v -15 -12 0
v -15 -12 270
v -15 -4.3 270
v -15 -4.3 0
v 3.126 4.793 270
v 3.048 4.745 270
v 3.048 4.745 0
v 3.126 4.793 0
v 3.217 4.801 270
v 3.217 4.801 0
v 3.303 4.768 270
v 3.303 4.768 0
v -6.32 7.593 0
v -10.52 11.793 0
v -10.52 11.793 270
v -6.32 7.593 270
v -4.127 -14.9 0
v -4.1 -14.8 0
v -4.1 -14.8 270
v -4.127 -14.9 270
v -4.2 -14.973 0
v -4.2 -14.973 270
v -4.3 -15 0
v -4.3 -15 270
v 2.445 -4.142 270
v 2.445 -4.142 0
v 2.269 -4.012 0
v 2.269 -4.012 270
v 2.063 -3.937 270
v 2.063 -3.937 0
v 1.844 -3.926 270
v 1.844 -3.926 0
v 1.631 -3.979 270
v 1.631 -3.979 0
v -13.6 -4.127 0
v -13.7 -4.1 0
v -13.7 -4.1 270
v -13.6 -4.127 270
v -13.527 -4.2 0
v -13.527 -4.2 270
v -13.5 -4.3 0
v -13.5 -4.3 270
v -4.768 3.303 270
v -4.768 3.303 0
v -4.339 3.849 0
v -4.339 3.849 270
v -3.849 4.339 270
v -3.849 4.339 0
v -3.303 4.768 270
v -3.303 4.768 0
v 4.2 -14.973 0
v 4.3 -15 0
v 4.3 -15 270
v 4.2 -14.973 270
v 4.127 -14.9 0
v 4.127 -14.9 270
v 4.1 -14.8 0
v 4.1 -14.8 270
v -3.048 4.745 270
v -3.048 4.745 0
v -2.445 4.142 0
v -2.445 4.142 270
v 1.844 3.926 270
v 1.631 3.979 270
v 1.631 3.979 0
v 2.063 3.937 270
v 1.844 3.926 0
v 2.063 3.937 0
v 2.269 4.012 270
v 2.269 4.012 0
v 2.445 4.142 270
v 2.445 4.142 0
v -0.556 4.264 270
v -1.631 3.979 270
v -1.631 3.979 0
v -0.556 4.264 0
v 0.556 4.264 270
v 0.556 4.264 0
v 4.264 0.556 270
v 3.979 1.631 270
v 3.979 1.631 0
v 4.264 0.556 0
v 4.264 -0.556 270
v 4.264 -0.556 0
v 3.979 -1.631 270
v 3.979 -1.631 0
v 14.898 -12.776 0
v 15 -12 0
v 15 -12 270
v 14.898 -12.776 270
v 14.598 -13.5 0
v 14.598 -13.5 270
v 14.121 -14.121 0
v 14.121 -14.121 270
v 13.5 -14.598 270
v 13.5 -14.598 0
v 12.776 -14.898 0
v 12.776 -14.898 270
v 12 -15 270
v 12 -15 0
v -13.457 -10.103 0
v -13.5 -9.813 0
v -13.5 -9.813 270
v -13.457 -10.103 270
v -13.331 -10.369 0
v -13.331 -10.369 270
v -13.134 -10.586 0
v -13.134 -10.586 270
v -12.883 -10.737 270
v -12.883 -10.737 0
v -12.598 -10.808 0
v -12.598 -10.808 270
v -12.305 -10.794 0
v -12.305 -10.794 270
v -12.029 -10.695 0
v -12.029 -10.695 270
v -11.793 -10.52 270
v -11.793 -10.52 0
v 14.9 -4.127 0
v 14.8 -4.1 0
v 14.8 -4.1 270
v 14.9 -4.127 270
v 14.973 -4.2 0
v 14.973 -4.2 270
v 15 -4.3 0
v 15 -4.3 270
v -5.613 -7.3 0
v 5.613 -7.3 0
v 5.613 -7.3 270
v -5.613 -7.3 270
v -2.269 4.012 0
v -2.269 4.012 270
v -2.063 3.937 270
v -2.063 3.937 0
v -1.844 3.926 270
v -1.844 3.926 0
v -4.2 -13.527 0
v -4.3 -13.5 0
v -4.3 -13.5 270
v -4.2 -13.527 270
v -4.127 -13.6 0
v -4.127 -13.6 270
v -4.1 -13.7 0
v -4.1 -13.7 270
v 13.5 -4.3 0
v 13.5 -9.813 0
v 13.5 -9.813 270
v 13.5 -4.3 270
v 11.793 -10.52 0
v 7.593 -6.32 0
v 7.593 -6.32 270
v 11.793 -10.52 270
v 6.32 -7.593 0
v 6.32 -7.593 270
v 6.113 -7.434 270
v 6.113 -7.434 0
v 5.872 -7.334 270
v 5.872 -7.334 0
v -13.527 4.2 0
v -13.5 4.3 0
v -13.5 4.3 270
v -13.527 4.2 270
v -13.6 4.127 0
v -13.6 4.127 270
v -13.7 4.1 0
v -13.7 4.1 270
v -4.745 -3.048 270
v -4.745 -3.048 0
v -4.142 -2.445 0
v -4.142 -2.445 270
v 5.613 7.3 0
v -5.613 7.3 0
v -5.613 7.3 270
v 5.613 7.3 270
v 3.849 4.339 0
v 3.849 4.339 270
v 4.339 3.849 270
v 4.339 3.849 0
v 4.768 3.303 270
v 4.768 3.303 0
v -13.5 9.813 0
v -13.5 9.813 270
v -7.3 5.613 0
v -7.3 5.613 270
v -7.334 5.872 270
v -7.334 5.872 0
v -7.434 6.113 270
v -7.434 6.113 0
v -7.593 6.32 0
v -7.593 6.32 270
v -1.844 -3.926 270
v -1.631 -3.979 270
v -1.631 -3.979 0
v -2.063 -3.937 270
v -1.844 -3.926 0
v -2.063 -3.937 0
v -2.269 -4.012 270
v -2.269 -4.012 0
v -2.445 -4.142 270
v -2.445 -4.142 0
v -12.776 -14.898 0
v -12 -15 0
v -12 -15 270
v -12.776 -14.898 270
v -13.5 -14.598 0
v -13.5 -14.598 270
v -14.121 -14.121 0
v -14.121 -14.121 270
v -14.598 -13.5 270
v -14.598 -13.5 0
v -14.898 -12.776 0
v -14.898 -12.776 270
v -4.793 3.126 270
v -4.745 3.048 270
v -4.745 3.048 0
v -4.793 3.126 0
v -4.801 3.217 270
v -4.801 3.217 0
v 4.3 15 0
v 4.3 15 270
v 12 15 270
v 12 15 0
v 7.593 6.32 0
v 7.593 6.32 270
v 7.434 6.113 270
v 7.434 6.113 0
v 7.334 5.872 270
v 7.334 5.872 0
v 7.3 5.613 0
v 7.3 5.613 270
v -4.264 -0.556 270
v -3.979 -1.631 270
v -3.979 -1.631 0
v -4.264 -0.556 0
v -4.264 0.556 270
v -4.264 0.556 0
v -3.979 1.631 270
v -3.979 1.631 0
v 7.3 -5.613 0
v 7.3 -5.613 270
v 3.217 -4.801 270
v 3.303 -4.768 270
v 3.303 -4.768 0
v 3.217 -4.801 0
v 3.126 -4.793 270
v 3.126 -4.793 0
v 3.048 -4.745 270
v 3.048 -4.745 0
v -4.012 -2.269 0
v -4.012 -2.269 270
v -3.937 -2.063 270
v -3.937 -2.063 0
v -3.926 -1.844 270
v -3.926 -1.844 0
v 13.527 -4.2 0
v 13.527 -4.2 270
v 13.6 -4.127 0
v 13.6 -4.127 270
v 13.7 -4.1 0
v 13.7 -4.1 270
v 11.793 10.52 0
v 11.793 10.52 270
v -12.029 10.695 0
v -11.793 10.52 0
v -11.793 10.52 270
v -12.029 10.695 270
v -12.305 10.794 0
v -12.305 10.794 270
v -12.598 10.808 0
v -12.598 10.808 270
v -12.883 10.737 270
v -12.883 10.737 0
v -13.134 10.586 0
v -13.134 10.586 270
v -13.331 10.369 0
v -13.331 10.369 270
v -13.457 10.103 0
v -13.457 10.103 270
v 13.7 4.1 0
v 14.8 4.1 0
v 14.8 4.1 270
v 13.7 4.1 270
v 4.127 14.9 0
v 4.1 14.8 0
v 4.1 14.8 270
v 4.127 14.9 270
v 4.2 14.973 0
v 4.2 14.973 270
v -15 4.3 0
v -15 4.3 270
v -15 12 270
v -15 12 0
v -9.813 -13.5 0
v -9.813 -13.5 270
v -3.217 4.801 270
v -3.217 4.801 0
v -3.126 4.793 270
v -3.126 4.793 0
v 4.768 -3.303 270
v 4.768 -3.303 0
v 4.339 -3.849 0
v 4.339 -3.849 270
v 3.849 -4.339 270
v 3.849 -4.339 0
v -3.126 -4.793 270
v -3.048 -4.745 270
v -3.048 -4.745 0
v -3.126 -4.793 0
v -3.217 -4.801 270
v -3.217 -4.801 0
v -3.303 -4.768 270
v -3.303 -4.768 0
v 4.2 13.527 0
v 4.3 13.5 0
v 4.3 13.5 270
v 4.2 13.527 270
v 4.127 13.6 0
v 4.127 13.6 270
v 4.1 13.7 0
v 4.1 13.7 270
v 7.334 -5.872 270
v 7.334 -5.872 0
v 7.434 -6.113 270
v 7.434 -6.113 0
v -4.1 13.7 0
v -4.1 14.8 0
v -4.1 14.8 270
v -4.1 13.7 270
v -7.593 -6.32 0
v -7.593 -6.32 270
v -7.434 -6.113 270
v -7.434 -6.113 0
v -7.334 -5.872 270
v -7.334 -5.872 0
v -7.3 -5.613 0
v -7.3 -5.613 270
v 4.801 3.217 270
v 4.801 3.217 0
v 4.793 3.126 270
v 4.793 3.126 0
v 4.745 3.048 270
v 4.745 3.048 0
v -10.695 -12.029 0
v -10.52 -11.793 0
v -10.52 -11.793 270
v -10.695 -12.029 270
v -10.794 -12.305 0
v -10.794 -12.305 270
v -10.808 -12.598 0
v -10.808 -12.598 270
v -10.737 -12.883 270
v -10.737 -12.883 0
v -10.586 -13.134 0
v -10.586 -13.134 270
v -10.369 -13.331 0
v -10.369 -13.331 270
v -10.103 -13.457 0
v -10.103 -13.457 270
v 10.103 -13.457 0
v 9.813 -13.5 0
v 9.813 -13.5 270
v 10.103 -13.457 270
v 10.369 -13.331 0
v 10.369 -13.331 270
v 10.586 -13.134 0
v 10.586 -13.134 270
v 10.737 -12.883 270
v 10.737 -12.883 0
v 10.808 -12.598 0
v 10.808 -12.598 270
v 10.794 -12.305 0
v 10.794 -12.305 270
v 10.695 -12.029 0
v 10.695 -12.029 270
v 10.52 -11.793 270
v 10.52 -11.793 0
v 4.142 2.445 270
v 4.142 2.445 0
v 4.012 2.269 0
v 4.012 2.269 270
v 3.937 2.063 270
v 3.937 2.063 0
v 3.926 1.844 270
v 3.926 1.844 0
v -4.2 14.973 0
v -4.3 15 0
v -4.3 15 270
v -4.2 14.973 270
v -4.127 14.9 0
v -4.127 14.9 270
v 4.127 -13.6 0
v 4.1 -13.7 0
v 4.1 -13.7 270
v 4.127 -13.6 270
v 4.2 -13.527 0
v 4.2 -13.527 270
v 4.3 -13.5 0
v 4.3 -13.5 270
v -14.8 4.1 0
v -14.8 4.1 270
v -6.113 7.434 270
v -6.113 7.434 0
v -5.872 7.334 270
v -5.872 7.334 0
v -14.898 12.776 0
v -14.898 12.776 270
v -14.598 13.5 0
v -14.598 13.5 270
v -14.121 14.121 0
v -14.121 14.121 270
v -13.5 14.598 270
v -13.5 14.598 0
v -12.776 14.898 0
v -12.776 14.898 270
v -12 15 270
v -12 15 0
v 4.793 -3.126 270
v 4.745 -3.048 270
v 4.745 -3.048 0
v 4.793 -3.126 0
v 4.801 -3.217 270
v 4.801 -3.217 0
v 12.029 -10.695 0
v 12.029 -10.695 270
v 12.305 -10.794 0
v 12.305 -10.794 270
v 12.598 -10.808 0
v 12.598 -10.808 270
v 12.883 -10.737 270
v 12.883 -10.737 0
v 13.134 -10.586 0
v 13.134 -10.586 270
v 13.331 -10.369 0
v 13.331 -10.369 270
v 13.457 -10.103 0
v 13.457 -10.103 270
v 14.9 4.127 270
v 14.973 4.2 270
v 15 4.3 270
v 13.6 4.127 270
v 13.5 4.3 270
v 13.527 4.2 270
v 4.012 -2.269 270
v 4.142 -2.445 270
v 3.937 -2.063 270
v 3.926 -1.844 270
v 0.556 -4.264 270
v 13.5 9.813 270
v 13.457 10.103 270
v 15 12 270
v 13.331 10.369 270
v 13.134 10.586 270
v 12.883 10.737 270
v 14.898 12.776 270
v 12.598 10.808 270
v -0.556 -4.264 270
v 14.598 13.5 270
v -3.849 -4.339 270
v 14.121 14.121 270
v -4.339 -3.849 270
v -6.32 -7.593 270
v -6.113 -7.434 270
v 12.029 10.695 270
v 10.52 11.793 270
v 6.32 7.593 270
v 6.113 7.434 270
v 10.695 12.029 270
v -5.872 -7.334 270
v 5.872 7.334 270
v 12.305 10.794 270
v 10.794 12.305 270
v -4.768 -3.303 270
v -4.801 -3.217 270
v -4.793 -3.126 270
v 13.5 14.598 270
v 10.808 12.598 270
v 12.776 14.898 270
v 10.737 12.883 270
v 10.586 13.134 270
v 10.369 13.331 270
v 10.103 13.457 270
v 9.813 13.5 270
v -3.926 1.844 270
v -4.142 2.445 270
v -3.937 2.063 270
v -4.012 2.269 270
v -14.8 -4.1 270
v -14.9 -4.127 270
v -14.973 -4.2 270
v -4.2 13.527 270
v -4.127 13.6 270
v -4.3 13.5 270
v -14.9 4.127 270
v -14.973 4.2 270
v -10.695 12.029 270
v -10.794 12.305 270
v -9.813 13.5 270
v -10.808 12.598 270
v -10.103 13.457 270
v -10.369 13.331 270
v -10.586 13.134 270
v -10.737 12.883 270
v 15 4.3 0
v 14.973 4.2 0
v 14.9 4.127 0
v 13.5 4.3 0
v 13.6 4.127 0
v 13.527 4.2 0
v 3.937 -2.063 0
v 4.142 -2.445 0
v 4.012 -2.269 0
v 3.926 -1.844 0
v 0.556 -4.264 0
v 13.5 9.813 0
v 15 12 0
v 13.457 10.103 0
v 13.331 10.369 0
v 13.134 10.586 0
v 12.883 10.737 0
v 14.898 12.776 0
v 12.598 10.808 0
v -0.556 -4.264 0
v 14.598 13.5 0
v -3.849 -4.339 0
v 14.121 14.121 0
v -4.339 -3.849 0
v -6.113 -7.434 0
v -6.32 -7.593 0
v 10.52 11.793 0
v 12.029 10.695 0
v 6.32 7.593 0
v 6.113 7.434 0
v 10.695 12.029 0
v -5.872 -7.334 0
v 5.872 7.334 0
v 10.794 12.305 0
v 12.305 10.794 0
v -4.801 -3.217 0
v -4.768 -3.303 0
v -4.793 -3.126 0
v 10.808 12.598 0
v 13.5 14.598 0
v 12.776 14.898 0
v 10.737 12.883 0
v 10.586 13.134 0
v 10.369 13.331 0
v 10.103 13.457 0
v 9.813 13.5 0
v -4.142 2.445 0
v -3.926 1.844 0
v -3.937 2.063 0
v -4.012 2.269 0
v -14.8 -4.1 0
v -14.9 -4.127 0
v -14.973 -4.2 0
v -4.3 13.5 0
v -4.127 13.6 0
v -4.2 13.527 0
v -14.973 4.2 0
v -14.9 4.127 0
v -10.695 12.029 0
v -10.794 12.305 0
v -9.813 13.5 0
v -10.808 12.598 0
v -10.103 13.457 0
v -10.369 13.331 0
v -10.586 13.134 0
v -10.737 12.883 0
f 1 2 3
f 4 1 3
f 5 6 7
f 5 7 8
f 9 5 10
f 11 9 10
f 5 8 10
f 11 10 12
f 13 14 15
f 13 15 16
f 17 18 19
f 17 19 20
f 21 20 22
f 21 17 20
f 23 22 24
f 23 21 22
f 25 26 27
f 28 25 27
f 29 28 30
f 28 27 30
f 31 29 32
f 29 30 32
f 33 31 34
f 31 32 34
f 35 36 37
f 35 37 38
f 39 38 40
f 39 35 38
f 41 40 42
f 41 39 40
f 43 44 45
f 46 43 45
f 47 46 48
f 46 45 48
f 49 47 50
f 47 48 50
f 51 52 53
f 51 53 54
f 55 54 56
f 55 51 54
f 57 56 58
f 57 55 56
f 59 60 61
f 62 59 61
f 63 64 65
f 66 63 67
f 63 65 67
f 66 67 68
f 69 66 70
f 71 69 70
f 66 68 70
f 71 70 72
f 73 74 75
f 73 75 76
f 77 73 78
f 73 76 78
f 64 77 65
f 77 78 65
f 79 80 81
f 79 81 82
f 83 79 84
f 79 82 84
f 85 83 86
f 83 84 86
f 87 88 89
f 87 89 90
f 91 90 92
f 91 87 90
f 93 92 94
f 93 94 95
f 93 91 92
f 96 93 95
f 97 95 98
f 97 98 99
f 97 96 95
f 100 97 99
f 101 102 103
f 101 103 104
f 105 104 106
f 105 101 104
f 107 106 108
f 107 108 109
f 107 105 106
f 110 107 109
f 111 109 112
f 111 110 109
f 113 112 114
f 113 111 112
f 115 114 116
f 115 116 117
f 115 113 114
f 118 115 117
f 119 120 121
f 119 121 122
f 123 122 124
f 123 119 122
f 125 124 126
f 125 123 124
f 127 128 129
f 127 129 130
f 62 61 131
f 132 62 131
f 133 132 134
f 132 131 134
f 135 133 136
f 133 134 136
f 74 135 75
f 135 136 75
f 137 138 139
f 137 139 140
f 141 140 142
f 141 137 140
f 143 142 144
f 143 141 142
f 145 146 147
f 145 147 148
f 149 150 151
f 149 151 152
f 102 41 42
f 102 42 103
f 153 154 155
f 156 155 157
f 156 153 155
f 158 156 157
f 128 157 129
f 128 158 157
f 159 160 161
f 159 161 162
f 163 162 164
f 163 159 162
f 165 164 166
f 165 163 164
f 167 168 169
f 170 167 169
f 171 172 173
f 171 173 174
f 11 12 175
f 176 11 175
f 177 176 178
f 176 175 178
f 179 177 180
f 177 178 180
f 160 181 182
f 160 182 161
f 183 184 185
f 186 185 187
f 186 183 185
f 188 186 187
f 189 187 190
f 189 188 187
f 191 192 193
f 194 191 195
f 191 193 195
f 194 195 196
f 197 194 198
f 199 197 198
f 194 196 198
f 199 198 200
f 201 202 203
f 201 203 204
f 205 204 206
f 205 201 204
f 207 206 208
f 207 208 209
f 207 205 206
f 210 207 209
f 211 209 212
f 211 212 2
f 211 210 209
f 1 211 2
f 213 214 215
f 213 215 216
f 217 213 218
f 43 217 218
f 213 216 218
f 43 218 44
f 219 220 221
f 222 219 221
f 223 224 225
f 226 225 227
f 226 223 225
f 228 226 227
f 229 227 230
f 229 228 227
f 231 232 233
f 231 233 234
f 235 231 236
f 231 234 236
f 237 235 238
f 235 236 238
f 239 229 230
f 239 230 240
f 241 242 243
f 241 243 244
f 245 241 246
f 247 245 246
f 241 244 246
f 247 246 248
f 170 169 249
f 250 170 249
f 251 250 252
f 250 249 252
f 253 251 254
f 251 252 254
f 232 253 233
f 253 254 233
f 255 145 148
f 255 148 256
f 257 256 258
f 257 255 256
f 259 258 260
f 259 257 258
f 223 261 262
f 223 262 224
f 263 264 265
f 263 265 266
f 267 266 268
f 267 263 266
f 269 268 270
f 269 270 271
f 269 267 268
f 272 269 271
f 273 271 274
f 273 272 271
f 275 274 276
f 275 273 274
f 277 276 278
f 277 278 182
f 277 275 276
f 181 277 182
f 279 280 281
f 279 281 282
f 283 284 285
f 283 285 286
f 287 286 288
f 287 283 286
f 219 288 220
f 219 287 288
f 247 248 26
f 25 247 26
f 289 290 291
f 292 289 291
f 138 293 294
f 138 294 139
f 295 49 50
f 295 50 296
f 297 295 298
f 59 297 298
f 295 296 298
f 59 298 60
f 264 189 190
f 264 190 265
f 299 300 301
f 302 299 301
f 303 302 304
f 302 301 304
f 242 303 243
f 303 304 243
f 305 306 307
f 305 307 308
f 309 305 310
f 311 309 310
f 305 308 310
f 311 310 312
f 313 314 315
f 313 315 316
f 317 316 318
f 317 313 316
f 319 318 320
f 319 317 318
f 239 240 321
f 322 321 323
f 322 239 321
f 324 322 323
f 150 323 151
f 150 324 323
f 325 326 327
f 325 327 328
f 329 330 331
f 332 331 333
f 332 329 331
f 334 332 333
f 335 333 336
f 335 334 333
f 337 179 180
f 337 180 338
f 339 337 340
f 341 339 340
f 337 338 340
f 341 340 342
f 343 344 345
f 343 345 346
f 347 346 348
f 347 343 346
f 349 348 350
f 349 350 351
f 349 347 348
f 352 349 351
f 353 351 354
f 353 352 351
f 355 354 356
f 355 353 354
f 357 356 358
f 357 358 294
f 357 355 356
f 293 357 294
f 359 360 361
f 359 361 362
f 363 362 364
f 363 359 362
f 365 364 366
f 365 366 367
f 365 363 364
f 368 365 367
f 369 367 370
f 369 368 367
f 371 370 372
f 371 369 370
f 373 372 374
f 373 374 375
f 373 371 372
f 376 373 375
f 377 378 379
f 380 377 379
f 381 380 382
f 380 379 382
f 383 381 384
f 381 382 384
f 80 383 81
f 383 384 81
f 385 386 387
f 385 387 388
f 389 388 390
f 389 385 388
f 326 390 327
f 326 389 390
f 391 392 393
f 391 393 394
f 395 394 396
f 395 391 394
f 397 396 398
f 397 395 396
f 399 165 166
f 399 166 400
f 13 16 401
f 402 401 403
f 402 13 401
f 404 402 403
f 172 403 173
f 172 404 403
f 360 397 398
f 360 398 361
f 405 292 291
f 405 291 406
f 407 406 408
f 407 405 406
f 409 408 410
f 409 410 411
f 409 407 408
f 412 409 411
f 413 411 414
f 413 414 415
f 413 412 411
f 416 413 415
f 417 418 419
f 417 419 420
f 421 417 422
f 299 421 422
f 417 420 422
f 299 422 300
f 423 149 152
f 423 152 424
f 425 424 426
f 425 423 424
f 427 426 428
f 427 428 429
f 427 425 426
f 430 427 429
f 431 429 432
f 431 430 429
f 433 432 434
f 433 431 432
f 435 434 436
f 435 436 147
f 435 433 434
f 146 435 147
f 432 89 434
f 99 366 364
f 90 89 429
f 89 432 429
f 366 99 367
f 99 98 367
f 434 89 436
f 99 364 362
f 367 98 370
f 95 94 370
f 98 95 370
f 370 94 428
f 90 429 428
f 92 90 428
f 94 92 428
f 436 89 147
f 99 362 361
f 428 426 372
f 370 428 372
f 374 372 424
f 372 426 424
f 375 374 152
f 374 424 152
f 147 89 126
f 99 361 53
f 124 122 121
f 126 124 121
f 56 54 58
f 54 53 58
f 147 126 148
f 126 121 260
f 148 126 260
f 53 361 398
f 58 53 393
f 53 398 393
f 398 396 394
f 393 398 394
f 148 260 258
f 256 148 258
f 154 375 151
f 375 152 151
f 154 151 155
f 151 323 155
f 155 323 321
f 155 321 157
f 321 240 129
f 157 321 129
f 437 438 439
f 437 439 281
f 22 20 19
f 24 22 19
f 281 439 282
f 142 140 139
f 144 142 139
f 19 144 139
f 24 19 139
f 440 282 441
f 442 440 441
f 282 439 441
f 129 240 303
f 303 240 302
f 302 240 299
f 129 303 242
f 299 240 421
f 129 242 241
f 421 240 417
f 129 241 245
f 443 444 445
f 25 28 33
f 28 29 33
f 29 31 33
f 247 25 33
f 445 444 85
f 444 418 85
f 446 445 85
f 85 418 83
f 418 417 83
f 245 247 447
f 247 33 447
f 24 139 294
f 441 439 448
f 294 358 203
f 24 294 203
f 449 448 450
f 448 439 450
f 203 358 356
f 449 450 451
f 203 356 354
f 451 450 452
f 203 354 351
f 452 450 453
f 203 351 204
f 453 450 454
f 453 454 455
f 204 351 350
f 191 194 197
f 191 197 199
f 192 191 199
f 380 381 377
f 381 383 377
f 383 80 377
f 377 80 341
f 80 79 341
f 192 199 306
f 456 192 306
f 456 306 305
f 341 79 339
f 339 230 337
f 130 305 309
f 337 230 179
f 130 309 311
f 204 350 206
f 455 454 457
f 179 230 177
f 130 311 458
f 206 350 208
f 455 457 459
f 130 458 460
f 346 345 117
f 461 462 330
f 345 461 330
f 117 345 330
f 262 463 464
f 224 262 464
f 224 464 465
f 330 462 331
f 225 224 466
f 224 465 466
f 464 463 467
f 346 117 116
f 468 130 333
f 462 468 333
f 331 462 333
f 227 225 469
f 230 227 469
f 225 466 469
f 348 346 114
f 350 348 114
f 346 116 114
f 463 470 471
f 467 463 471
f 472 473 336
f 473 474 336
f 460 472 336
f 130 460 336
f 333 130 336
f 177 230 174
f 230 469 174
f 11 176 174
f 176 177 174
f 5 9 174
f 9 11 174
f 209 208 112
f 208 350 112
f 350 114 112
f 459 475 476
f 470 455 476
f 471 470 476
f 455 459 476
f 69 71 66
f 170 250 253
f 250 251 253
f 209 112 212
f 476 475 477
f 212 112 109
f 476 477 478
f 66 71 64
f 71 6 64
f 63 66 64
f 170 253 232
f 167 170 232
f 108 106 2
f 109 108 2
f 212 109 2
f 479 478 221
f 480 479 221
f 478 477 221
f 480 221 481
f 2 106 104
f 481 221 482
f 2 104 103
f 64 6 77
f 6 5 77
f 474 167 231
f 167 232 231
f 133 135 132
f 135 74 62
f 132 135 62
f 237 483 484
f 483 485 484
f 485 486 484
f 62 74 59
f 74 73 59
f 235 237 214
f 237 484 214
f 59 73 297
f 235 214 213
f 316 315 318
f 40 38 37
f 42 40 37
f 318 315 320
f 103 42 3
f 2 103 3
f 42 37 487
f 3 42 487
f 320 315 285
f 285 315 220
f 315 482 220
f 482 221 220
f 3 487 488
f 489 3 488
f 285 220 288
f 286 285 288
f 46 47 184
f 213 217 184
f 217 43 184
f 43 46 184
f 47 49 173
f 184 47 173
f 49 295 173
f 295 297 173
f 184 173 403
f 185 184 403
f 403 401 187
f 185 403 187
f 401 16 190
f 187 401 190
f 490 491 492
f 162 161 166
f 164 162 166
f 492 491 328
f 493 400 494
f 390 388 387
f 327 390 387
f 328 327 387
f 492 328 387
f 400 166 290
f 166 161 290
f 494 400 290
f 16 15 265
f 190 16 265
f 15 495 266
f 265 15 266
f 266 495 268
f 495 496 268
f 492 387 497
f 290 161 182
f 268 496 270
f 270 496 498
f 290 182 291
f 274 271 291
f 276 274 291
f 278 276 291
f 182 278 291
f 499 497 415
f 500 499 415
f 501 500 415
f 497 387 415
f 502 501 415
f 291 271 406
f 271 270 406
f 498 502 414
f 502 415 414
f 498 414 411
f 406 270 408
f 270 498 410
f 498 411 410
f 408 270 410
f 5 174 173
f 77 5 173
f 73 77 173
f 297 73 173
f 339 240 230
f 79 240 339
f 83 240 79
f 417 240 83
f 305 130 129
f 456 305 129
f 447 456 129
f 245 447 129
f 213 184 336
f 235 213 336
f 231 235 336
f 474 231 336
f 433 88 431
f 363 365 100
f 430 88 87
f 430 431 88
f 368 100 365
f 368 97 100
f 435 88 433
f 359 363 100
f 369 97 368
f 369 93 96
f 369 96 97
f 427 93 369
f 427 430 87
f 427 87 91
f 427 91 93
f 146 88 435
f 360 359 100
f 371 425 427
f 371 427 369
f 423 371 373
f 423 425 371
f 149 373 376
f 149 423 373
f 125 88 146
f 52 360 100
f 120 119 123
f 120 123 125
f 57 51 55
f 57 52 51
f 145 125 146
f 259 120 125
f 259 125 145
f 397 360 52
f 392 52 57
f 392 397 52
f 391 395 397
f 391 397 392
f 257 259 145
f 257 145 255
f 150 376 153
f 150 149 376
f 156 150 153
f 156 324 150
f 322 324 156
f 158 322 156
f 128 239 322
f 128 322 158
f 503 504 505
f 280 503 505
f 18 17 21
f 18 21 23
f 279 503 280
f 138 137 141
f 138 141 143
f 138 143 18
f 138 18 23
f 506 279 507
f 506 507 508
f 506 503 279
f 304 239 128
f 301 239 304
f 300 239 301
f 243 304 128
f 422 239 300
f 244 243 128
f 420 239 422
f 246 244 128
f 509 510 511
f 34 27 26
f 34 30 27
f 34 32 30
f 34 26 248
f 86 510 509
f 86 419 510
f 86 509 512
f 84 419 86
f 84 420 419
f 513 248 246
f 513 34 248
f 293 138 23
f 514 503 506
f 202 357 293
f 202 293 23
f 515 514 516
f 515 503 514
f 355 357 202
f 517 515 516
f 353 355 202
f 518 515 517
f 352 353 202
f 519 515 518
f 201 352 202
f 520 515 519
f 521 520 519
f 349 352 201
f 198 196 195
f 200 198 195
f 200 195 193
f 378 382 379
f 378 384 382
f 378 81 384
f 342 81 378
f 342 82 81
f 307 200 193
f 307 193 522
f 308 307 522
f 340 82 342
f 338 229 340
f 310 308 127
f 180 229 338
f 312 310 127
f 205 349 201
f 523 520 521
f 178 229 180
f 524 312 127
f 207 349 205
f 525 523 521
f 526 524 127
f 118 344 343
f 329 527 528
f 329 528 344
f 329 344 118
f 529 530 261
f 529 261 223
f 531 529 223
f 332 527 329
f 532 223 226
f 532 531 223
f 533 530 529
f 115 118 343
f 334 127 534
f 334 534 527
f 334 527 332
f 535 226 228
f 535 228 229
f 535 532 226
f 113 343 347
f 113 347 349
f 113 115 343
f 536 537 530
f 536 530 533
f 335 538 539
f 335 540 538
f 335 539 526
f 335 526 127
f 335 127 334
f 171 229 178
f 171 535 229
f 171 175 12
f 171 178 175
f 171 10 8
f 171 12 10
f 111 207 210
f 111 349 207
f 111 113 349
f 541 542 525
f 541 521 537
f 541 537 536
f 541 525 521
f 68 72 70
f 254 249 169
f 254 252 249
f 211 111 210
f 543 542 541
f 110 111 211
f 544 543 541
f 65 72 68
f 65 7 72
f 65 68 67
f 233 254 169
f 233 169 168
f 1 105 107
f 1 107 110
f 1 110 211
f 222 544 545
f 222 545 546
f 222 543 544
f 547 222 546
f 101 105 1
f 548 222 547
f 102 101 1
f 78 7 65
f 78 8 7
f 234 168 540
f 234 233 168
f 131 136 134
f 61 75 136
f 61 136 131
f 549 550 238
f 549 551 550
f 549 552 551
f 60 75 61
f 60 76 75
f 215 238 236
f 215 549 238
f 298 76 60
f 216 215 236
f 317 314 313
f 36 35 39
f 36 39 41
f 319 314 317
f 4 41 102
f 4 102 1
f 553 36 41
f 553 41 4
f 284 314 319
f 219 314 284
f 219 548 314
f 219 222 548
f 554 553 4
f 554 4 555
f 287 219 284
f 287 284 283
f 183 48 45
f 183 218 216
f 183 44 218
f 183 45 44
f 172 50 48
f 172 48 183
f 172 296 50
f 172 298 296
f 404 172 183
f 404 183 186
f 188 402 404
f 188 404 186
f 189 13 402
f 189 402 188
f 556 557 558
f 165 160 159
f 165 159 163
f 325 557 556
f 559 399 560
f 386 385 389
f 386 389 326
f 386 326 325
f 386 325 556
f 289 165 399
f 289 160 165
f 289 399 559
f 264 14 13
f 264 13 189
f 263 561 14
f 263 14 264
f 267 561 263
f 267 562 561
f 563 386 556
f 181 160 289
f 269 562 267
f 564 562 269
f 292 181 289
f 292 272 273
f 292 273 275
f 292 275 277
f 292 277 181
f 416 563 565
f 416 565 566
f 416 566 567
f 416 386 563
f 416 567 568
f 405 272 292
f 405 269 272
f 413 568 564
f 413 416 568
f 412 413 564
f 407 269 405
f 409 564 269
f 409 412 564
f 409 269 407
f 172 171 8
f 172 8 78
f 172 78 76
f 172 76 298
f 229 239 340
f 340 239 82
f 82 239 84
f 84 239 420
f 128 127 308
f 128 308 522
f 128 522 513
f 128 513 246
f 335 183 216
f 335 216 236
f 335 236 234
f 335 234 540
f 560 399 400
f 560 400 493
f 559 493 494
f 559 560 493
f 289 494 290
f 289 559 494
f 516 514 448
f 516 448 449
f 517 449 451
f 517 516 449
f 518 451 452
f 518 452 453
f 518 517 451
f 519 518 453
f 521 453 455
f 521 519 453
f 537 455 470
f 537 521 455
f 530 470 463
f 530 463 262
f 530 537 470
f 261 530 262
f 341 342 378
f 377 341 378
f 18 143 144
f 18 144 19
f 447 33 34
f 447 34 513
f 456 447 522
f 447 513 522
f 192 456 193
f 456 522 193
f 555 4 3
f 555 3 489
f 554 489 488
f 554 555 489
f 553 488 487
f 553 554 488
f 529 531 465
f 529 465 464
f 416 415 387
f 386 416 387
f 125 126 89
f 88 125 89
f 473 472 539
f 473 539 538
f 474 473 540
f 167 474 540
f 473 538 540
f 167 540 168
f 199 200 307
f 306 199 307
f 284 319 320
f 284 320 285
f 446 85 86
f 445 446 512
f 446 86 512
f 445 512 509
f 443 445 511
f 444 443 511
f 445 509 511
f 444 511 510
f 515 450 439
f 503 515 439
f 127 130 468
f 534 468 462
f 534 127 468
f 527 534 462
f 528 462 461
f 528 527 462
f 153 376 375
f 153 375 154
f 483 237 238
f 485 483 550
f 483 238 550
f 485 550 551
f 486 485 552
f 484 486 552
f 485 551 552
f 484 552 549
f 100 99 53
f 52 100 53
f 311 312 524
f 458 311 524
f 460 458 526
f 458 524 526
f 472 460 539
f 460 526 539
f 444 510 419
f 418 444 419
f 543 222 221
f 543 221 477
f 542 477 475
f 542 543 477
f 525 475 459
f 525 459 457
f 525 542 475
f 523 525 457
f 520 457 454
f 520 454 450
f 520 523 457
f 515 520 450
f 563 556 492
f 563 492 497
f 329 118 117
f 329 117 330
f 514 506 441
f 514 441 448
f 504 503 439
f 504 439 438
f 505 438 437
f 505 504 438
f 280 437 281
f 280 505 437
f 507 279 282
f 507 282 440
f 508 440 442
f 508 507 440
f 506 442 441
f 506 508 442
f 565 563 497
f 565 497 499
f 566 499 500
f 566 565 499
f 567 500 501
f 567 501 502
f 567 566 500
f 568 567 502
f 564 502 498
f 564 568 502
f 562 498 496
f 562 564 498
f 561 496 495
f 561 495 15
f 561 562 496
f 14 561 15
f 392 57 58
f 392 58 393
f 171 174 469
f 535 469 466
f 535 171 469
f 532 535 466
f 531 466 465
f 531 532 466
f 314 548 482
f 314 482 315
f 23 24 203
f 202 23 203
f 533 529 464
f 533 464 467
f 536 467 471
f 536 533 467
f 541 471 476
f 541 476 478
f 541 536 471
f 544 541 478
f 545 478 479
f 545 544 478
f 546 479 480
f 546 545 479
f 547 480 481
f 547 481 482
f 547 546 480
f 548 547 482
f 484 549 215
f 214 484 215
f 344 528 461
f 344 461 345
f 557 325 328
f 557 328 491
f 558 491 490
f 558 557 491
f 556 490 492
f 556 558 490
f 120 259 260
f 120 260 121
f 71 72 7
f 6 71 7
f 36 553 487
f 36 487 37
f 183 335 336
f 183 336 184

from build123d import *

# Parameters (mm, degrees)
EXTRUDE1_DEPTH = 270


with BuildPart() as part:
    # Sketch1 → Extrude1 (new body)
    with BuildSketch(Plane.XY):
        with BuildLine():
            Line((-12, 15), (-4.3, 15))
            ThreePointArc((-4.3, 15), (-4.158578644, 14.941421356), (-4.1, 14.8))
            Line((-4.1, 14.8), (-4.1, 13.7))
            ThreePointArc((-4.1, 13.7), (-4.158578644, 13.558578644), (-4.3, 13.5))
            Line((-4.3, 13.5), (-9.812994231, 13.5))
            ThreePointArc((-9.812994231, 13.5), (-10.736873764, 12.882683432), (-10.520101013, 11.792893219))
            Line((-10.520101013, 11.792893219), (-6.320101013, 7.592893219))
            ThreePointArc((-6.320101013, 7.592893219), (-5.995677664, 7.376120467), (-5.612994231, 7.3))
            Line((-5.612994231, 7.3), (5.612994231, 7.3))
            ThreePointArc((5.612994231, 7.3), (5.995677664, 7.376120467), (6.320101013, 7.592893219))
            Line((6.320101013, 7.592893219), (10.520101013, 11.792893219))
            ThreePointArc((10.520101013, 11.792893219), (10.736873764, 12.882683432), (9.812994231, 13.5))
            Line((9.812994231, 13.5), (4.3, 13.5))
            ThreePointArc((4.3, 13.5), (4.158578644, 13.558578644), (4.1, 13.7))
            Line((4.1, 13.7), (4.1, 14.8))
            ThreePointArc((4.1, 14.8), (4.158578644, 14.941421356), (4.3, 15))
            Line((4.3, 15), (12, 15))
            ThreePointArc((12, 15), (14.121320344, 14.121320344), (15, 12))
            Line((15, 12), (15, 4.3))
            ThreePointArc((15, 4.3), (14.941421356, 4.158578644), (14.8, 4.1))
            Line((14.8, 4.1), (13.7, 4.1))
            ThreePointArc((13.7, 4.1), (13.558578644, 4.158578644), (13.5, 4.3))
            Line((13.5, 4.3), (13.5, 9.812994231))
            ThreePointArc((13.5, 9.812994231), (12.882683432, 10.736873764), (11.792893219, 10.520101013))
            Line((11.792893219, 10.520101013), (7.592893219, 6.320101013))
            ThreePointArc((7.592893219, 6.320101013), (7.376120467, 5.995677664), (7.3, 5.612994231))
            Line((7.3, 5.612994231), (7.3, -5.612994231))
            ThreePointArc((7.3, -5.612994231), (7.376120467, -5.995677664), (7.592893219, -6.320101013))
            Line((7.592893219, -6.320101013), (11.792893219, -10.520101013))
            ThreePointArc((11.792893219, -10.520101013), (12.882683432, -10.736873764), (13.5, -9.812994231))
            Line((13.5, -9.812994231), (13.5, -4.3))
            ThreePointArc((13.5, -4.3), (13.558578644, -4.158578644), (13.7, -4.1))
            Line((13.7, -4.1), (14.8, -4.1))
            ThreePointArc((14.8, -4.1), (14.941421356, -4.158578644), (15, -4.3))
            Line((15, -4.3), (15, -12))
            ThreePointArc((15, -12), (14.121320344, -14.121320344), (12, -15))
            Line((12, -15), (4.3, -15))
            ThreePointArc((4.3, -15), (4.158578644, -14.941421356), (4.1, -14.8))
            Line((4.1, -14.8), (4.1, -13.7))
            ThreePointArc((4.1, -13.7), (4.158578644, -13.558578644), (4.3, -13.5))
            Line((4.3, -13.5), (9.812994231, -13.5))
            ThreePointArc((9.812994231, -13.5), (10.736873764, -12.882683432), (10.520101013, -11.792893219))
            Line((10.520101013, -11.792893219), (6.320101013, -7.592893219))
            ThreePointArc((6.320101013, -7.592893219), (5.995677664, -7.376120467), (5.612994231, -7.3))
            Line((5.612994231, -7.3), (-5.612994231, -7.3))
            ThreePointArc((-5.612994231, -7.3), (-5.995677664, -7.376120467), (-6.320101013, -7.592893219))
            Line((-6.320101013, -7.592893219), (-10.520101013, -11.792893219))
            ThreePointArc((-10.520101013, -11.792893219), (-10.736873764, -12.882683432), (-9.812994231, -13.5))
            Line((-9.812994231, -13.5), (-4.3, -13.5))
            ThreePointArc((-4.3, -13.5), (-4.158578644, -13.558578644), (-4.1, -13.7))
            Line((-4.1, -13.7), (-4.1, -14.8))
            ThreePointArc((-4.1, -14.8), (-4.158578644, -14.941421356), (-4.3, -15))
            Line((-4.3, -15), (-12, -15))
            ThreePointArc((-12, -15), (-14.121320344, -14.121320344), (-15, -12))
            Line((-15, -12), (-15, -4.3))
            ThreePointArc((-15, -4.3), (-14.941421356, -4.158578644), (-14.8, -4.1))
            Line((-14.8, -4.1), (-13.7, -4.1))
            ThreePointArc((-13.7, -4.1), (-13.558578644, -4.158578644), (-13.5, -4.3))
            Line((-13.5, -4.3), (-13.5, -9.812994231))
            ThreePointArc((-13.5, -9.812994231), (-12.882683432, -10.736873764), (-11.792893219, -10.520101013))
            Line((-11.792893219, -10.520101013), (-7.592893219, -6.320101013))
            ThreePointArc((-7.592893219, -6.320101013), (-7.376120467, -5.995677664), (-7.3, -5.612994231))
            Line((-7.3, -5.612994231), (-7.3, 5.612994231))
            ThreePointArc((-7.3, 5.612994231), (-7.376120467, 5.995677664), (-7.592893219, 6.320101013))
            Line((-7.592893219, 6.320101013), (-11.792893219, 10.520101013))
            ThreePointArc((-11.792893219, 10.520101013), (-12.882683432, 10.736873764), (-13.5, 9.812994231))
            Line((-13.5, 9.812994231), (-13.5, 4.3))
            ThreePointArc((-13.5, 4.3), (-13.558578644, 4.158578644), (-13.7, 4.1))
            Line((-13.7, 4.1), (-14.8, 4.1))
            ThreePointArc((-14.8, 4.1), (-14.941421356, 4.158578644), (-15, 4.3))
            Line((-15, 4.3), (-15, 12))
            ThreePointArc((-15, 12), (-14.121320344, 14.121320344), (-12, 15))
        make_face()
        with BuildLine():
            Line((-3.04762381, 4.744680085), (-2.445405681, 4.142461956))
            ThreePointArc((-2.445405681, 4.142461956), (-2.06276965, 3.937478186), (-1.630658427, 3.978813026))
            ThreePointArc((-1.630658427, 3.978813026), (0, 4.3), (1.630658427, 3.978813026))
            ThreePointArc((1.630658427, 3.978813026), (2.06276965, 3.937478186), (2.445405681, 4.142461956))
            Line((2.445405681, 4.142461956), (3.04762381, 4.744680085))
            ThreePointArc((3.04762381, 4.744680085), (3.171115834, 4.802453455), (3.302939637, 4.767660826))
            ThreePointArc((3.302939637, 4.767660826), (4.101219331, 4.101219331), (4.767660826, 3.302939637))
            ThreePointArc((4.767660826, 3.302939637), (4.802453455, 3.171115834), (4.744680085, 3.04762381))
            Line((4.744680085, 3.04762381), (4.142461956, 2.445405681))
            ThreePointArc((4.142461956, 2.445405681), (3.937478186, 2.06276965), (3.978813026, 1.630658427))
            ThreePointArc((3.978813026, 1.630658427), (4.3, 0), (3.978813026, -1.630658427))
            ThreePointArc((3.978813026, -1.630658427), (3.937478186, -2.06276965), (4.142461956, -2.445405681))
            Line((4.142461956, -2.445405681), (4.744680085, -3.04762381))
            ThreePointArc((4.744680085, -3.04762381), (4.802453455, -3.171115834), (4.767660826, -3.302939637))
            ThreePointArc((4.767660826, -3.302939637), (4.101219331, -4.101219331), (3.302939637, -4.767660826))
            ThreePointArc((3.302939637, -4.767660826), (3.171115834, -4.802453455), (3.04762381, -4.744680085))
            Line((3.04762381, -4.744680085), (2.445405681, -4.142461956))
            ThreePointArc((2.445405681, -4.142461956), (2.06276965, -3.937478186), (1.630658427, -3.978813026))
            ThreePointArc((1.630658427, -3.978813026), (0, -4.3), (-1.630658427, -3.978813026))
            ThreePointArc((-1.630658427, -3.978813026), (-2.06276965, -3.937478186), (-2.445405681, -4.142461956))
            Line((-2.445405681, -4.142461956), (-3.04762381, -4.744680085))
            ThreePointArc((-3.04762381, -4.744680085), (-3.171115834, -4.802453455), (-3.302939637, -4.767660826))
            ThreePointArc((-3.302939637, -4.767660826), (-4.101219331, -4.101219331), (-4.767660826, -3.302939637))
            ThreePointArc((-4.767660826, -3.302939637), (-4.802453455, -3.171115834), (-4.744680085, -3.04762381))
            Line((-4.744680085, -3.04762381), (-4.142461956, -2.445405681))
            ThreePointArc((-4.142461956, -2.445405681), (-3.937478186, -2.06276965), (-3.978813026, -1.630658427))
            ThreePointArc((-3.978813026, -1.630658427), (-4.3, 0), (-3.978813026, 1.630658427))
            ThreePointArc((-3.978813026, 1.630658427), (-3.937478186, 2.06276965), (-4.142461956, 2.445405681))
            Line((-4.142461956, 2.445405681), (-4.744680085, 3.04762381))
            ThreePointArc((-4.744680085, 3.04762381), (-4.802453455, 3.171115834), (-4.767660826, 3.302939637))
            ThreePointArc((-4.767660826, 3.302939637), (-4.101219331, 4.101219331), (-3.302939637, 4.767660826))
            ThreePointArc((-3.302939637, 4.767660826), (-3.171115834, 4.802453455), (-3.04762381, 4.744680085))
        make_face(mode=Mode.SUBTRACT)
    extrude(amount=EXTRUDE1_DEPTH)


solid = part.part
